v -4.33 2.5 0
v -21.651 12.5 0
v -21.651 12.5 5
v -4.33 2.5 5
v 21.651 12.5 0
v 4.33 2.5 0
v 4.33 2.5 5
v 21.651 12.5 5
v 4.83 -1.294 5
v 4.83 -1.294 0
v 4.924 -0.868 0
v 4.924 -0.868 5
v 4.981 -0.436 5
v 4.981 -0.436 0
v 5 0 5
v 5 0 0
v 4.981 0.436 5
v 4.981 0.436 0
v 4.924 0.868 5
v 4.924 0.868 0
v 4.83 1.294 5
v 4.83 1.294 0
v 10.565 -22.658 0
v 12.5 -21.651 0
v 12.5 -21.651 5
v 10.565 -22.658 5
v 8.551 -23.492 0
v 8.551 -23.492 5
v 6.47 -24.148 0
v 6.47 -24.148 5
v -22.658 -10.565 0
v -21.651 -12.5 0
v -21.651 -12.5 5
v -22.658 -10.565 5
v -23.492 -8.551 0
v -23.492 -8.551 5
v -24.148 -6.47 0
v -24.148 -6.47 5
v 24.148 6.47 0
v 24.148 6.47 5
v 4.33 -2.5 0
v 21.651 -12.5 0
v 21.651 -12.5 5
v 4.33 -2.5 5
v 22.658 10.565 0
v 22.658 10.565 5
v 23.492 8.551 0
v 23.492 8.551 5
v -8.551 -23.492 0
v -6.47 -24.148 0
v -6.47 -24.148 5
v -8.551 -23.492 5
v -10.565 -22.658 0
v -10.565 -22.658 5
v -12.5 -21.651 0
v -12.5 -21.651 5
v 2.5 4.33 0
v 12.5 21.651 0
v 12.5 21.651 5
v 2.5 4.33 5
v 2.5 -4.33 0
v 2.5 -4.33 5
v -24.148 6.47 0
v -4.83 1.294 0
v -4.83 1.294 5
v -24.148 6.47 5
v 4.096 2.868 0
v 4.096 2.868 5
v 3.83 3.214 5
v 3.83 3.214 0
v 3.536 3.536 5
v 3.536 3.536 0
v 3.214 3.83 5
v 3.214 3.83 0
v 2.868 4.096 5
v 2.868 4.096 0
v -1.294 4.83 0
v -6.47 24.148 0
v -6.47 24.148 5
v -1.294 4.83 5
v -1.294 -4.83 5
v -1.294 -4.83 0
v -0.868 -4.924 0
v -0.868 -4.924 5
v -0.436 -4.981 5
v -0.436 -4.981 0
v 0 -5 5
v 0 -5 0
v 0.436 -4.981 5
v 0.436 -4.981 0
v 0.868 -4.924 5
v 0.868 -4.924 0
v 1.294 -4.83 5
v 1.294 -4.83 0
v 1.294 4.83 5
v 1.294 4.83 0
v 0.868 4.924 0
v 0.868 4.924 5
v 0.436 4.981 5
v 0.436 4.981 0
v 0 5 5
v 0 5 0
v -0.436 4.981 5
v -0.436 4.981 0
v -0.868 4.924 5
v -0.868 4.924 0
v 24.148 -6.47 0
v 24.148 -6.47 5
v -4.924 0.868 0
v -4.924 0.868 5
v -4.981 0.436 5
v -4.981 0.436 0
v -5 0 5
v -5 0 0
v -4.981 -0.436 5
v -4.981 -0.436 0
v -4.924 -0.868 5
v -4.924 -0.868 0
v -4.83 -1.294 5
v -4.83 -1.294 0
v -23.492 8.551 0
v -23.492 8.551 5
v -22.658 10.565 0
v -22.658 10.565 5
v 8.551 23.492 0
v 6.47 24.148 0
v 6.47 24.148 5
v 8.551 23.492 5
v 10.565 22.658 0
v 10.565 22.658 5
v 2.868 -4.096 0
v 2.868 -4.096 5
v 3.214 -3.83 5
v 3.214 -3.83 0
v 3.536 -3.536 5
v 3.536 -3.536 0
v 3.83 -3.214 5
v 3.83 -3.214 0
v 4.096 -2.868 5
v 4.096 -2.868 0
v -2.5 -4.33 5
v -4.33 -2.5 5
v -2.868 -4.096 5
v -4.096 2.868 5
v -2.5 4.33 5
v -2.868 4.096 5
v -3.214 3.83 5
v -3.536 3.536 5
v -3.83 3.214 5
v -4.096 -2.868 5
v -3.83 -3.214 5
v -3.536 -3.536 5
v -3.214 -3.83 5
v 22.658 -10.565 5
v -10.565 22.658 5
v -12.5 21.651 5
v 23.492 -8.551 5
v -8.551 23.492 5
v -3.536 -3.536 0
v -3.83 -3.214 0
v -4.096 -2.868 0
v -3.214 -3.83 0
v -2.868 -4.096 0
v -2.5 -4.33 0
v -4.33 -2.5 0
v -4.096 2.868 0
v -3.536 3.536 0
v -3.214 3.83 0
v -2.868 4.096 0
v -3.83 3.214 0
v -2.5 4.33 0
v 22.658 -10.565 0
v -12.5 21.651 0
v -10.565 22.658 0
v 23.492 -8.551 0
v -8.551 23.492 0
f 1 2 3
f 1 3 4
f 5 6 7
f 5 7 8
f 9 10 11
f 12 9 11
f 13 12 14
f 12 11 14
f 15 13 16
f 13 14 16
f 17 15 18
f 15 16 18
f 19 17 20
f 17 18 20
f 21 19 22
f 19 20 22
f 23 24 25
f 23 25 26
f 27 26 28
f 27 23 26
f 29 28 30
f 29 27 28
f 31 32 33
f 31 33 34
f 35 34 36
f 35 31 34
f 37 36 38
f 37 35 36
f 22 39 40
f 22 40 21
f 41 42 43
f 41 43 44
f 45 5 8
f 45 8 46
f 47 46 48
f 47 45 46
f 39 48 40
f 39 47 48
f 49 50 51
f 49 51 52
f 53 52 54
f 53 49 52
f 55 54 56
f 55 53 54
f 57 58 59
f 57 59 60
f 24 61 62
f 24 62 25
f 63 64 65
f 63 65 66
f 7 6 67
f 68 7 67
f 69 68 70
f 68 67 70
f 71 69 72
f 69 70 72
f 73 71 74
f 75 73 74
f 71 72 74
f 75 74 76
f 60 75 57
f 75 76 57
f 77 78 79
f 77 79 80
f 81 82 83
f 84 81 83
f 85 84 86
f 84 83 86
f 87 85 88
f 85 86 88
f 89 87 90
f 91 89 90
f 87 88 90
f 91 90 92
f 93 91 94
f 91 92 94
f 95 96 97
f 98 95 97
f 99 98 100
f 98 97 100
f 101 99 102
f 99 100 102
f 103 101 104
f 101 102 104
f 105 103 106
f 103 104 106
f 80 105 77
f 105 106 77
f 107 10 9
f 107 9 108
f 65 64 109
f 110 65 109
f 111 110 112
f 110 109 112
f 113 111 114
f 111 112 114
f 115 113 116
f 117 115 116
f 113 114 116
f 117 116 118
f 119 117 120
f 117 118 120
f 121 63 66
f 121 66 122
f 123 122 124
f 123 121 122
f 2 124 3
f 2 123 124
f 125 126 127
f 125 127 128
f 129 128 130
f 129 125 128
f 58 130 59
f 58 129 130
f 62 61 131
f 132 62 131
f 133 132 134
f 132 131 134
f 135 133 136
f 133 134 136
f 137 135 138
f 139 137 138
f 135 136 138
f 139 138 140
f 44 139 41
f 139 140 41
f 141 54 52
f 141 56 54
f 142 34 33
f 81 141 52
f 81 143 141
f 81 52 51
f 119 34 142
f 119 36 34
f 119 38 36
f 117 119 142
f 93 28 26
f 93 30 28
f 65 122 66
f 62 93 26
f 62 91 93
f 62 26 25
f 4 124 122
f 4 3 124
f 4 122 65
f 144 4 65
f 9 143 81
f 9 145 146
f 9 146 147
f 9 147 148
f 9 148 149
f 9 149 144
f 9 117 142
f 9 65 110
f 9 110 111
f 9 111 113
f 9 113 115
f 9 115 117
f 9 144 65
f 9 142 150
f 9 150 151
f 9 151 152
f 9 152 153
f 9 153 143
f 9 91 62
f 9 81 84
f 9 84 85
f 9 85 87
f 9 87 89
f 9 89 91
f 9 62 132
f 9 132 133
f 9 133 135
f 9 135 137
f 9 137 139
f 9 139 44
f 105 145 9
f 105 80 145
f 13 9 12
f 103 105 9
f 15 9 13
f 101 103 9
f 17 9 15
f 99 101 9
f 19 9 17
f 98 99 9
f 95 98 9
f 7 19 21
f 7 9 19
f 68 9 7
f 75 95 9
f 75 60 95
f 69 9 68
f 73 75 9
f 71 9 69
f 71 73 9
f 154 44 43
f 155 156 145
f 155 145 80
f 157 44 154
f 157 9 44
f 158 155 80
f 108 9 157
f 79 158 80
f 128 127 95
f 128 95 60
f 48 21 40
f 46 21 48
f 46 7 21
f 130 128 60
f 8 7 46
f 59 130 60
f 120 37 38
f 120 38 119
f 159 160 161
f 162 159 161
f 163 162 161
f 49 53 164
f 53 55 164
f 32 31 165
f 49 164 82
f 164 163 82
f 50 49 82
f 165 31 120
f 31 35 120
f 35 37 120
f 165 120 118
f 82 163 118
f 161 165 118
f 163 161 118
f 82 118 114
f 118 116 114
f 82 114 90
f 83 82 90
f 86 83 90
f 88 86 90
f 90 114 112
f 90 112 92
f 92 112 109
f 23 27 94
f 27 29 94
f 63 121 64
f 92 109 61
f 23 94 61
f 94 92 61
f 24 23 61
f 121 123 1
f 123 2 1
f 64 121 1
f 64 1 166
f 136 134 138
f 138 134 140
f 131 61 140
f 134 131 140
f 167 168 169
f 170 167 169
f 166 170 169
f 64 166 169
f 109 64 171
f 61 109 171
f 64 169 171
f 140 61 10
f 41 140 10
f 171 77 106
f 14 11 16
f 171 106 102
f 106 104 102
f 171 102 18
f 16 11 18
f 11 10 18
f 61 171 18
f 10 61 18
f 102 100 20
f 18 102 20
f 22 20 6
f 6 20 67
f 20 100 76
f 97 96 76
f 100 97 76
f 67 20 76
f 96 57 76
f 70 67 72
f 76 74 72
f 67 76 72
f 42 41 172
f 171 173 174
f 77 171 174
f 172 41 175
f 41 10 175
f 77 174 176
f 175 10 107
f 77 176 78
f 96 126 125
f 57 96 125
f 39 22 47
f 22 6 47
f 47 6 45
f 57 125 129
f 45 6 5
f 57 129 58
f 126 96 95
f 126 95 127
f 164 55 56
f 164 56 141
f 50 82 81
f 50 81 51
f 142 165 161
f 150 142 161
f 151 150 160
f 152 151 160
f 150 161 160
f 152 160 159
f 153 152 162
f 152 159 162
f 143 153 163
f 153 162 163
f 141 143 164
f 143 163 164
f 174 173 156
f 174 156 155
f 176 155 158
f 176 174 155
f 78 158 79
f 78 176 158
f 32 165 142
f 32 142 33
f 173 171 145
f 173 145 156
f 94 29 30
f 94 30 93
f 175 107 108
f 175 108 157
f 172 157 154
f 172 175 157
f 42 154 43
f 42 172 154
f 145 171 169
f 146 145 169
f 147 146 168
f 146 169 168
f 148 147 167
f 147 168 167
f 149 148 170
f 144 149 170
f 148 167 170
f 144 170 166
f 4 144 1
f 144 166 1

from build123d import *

# Parameters (mm, degrees)
BOSS_EXTRU_1_DEPTH           = 5
R_P_TITION_CIRCULAIRE1_COUNT = 8
ESQUISSE2_R                  = 5
BOSS_EXTRU_2_DEPTH           = 5


with BuildPart() as part:
    # Esquisse1 → Boss.-Extru.1 (new body)
    with BuildSketch(Plane.XY):
        with BuildLine():
            Line((1.294095226, 4.829629131), (6.470476128, 24.148145657))
            ThreePointArc((6.470476128, 24.148145657), (9.567085809, 23.096988313), (12.5, 21.650635095))
            Line((12.5, 21.650635095), (2.5, 4.330127019))
            ThreePointArc((2.5, 4.330127019), (1.913417162, 4.619397663), (1.294095226, 4.829629131))
        make_face()
    extrude(amount=BOSS_EXTRU_1_DEPTH)


with BuildPart() as r_p_tition_circulaire1_1:
    # Répétition circulaire1: pattern copy
    add(part.part.rotate(Axis((0, 0, 28.256111415), (0, 0, -1)), 1 * 360 / R_P_TITION_CIRCULAIRE1_COUNT))


with BuildPart() as r_p_tition_circulaire1_2:
    # Répétition circulaire1: pattern copy
    add(part.part.rotate(Axis((0, 0, 28.256111415), (0, 0, -1)), 2 * 360 / R_P_TITION_CIRCULAIRE1_COUNT))


with BuildPart() as r_p_tition_circulaire1_3:
    # Répétition circulaire1: pattern copy
    add(part.part.rotate(Axis((0, 0, 28.256111415), (0, 0, -1)), 3 * 360 / R_P_TITION_CIRCULAIRE1_COUNT))


with BuildPart() as r_p_tition_circulaire1_4:
    # Répétition circulaire1: pattern copy
    add(part.part.rotate(Axis((0, 0, 28.256111415), (0, 0, -1)), 4 * 360 / R_P_TITION_CIRCULAIRE1_COUNT))


with BuildPart() as r_p_tition_circulaire1_5:
    # Répétition circulaire1: pattern copy
    add(part.part.rotate(Axis((0, 0, 28.256111415), (0, 0, -1)), 5 * 360 / R_P_TITION_CIRCULAIRE1_COUNT))


with BuildPart() as r_p_tition_circulaire1_6:
    # Répétition circulaire1: pattern copy
    add(part.part.rotate(Axis((0, 0, 28.256111415), (0, 0, -1)), 6 * 360 / R_P_TITION_CIRCULAIRE1_COUNT))


with BuildPart() as r_p_tition_circulaire1_7:
    # Répétition circulaire1: pattern copy
    add(part.part.rotate(Axis((0, 0, 28.256111415), (0, 0, -1)), 7 * 360 / R_P_TITION_CIRCULAIRE1_COUNT))


with BuildPart() as part_1:
    add(part.part)

    add(r_p_tition_circulaire1_1.part)  # Boss.-Extru.2 merges Répétition circulaire1_1

    add(r_p_tition_circulaire1_2.part)  # Boss.-Extru.2 merges Répétition circulaire1_2

    add(r_p_tition_circulaire1_3.part)  # Boss.-Extru.2 merges Répétition circulaire1_3

    add(r_p_tition_circulaire1_4.part)  # Boss.-Extru.2 merges Répétition circulaire1_4

    add(r_p_tition_circulaire1_5.part)  # Boss.-Extru.2 merges Répétition circulaire1_5

    add(r_p_tition_circulaire1_6.part)  # Boss.-Extru.2 merges Répétition circulaire1_6

    add(r_p_tition_circulaire1_7.part)  # Boss.-Extru.2 merges Répétition circulaire1_7
    # Esquisse2 → Boss.-Extru.2 (add)
    with BuildSketch(Plane.XY):
        Circle(ESQUISSE2_R)
    extrude(amount=BOSS_EXTRU_2_DEPTH)


solid = part_1.part
